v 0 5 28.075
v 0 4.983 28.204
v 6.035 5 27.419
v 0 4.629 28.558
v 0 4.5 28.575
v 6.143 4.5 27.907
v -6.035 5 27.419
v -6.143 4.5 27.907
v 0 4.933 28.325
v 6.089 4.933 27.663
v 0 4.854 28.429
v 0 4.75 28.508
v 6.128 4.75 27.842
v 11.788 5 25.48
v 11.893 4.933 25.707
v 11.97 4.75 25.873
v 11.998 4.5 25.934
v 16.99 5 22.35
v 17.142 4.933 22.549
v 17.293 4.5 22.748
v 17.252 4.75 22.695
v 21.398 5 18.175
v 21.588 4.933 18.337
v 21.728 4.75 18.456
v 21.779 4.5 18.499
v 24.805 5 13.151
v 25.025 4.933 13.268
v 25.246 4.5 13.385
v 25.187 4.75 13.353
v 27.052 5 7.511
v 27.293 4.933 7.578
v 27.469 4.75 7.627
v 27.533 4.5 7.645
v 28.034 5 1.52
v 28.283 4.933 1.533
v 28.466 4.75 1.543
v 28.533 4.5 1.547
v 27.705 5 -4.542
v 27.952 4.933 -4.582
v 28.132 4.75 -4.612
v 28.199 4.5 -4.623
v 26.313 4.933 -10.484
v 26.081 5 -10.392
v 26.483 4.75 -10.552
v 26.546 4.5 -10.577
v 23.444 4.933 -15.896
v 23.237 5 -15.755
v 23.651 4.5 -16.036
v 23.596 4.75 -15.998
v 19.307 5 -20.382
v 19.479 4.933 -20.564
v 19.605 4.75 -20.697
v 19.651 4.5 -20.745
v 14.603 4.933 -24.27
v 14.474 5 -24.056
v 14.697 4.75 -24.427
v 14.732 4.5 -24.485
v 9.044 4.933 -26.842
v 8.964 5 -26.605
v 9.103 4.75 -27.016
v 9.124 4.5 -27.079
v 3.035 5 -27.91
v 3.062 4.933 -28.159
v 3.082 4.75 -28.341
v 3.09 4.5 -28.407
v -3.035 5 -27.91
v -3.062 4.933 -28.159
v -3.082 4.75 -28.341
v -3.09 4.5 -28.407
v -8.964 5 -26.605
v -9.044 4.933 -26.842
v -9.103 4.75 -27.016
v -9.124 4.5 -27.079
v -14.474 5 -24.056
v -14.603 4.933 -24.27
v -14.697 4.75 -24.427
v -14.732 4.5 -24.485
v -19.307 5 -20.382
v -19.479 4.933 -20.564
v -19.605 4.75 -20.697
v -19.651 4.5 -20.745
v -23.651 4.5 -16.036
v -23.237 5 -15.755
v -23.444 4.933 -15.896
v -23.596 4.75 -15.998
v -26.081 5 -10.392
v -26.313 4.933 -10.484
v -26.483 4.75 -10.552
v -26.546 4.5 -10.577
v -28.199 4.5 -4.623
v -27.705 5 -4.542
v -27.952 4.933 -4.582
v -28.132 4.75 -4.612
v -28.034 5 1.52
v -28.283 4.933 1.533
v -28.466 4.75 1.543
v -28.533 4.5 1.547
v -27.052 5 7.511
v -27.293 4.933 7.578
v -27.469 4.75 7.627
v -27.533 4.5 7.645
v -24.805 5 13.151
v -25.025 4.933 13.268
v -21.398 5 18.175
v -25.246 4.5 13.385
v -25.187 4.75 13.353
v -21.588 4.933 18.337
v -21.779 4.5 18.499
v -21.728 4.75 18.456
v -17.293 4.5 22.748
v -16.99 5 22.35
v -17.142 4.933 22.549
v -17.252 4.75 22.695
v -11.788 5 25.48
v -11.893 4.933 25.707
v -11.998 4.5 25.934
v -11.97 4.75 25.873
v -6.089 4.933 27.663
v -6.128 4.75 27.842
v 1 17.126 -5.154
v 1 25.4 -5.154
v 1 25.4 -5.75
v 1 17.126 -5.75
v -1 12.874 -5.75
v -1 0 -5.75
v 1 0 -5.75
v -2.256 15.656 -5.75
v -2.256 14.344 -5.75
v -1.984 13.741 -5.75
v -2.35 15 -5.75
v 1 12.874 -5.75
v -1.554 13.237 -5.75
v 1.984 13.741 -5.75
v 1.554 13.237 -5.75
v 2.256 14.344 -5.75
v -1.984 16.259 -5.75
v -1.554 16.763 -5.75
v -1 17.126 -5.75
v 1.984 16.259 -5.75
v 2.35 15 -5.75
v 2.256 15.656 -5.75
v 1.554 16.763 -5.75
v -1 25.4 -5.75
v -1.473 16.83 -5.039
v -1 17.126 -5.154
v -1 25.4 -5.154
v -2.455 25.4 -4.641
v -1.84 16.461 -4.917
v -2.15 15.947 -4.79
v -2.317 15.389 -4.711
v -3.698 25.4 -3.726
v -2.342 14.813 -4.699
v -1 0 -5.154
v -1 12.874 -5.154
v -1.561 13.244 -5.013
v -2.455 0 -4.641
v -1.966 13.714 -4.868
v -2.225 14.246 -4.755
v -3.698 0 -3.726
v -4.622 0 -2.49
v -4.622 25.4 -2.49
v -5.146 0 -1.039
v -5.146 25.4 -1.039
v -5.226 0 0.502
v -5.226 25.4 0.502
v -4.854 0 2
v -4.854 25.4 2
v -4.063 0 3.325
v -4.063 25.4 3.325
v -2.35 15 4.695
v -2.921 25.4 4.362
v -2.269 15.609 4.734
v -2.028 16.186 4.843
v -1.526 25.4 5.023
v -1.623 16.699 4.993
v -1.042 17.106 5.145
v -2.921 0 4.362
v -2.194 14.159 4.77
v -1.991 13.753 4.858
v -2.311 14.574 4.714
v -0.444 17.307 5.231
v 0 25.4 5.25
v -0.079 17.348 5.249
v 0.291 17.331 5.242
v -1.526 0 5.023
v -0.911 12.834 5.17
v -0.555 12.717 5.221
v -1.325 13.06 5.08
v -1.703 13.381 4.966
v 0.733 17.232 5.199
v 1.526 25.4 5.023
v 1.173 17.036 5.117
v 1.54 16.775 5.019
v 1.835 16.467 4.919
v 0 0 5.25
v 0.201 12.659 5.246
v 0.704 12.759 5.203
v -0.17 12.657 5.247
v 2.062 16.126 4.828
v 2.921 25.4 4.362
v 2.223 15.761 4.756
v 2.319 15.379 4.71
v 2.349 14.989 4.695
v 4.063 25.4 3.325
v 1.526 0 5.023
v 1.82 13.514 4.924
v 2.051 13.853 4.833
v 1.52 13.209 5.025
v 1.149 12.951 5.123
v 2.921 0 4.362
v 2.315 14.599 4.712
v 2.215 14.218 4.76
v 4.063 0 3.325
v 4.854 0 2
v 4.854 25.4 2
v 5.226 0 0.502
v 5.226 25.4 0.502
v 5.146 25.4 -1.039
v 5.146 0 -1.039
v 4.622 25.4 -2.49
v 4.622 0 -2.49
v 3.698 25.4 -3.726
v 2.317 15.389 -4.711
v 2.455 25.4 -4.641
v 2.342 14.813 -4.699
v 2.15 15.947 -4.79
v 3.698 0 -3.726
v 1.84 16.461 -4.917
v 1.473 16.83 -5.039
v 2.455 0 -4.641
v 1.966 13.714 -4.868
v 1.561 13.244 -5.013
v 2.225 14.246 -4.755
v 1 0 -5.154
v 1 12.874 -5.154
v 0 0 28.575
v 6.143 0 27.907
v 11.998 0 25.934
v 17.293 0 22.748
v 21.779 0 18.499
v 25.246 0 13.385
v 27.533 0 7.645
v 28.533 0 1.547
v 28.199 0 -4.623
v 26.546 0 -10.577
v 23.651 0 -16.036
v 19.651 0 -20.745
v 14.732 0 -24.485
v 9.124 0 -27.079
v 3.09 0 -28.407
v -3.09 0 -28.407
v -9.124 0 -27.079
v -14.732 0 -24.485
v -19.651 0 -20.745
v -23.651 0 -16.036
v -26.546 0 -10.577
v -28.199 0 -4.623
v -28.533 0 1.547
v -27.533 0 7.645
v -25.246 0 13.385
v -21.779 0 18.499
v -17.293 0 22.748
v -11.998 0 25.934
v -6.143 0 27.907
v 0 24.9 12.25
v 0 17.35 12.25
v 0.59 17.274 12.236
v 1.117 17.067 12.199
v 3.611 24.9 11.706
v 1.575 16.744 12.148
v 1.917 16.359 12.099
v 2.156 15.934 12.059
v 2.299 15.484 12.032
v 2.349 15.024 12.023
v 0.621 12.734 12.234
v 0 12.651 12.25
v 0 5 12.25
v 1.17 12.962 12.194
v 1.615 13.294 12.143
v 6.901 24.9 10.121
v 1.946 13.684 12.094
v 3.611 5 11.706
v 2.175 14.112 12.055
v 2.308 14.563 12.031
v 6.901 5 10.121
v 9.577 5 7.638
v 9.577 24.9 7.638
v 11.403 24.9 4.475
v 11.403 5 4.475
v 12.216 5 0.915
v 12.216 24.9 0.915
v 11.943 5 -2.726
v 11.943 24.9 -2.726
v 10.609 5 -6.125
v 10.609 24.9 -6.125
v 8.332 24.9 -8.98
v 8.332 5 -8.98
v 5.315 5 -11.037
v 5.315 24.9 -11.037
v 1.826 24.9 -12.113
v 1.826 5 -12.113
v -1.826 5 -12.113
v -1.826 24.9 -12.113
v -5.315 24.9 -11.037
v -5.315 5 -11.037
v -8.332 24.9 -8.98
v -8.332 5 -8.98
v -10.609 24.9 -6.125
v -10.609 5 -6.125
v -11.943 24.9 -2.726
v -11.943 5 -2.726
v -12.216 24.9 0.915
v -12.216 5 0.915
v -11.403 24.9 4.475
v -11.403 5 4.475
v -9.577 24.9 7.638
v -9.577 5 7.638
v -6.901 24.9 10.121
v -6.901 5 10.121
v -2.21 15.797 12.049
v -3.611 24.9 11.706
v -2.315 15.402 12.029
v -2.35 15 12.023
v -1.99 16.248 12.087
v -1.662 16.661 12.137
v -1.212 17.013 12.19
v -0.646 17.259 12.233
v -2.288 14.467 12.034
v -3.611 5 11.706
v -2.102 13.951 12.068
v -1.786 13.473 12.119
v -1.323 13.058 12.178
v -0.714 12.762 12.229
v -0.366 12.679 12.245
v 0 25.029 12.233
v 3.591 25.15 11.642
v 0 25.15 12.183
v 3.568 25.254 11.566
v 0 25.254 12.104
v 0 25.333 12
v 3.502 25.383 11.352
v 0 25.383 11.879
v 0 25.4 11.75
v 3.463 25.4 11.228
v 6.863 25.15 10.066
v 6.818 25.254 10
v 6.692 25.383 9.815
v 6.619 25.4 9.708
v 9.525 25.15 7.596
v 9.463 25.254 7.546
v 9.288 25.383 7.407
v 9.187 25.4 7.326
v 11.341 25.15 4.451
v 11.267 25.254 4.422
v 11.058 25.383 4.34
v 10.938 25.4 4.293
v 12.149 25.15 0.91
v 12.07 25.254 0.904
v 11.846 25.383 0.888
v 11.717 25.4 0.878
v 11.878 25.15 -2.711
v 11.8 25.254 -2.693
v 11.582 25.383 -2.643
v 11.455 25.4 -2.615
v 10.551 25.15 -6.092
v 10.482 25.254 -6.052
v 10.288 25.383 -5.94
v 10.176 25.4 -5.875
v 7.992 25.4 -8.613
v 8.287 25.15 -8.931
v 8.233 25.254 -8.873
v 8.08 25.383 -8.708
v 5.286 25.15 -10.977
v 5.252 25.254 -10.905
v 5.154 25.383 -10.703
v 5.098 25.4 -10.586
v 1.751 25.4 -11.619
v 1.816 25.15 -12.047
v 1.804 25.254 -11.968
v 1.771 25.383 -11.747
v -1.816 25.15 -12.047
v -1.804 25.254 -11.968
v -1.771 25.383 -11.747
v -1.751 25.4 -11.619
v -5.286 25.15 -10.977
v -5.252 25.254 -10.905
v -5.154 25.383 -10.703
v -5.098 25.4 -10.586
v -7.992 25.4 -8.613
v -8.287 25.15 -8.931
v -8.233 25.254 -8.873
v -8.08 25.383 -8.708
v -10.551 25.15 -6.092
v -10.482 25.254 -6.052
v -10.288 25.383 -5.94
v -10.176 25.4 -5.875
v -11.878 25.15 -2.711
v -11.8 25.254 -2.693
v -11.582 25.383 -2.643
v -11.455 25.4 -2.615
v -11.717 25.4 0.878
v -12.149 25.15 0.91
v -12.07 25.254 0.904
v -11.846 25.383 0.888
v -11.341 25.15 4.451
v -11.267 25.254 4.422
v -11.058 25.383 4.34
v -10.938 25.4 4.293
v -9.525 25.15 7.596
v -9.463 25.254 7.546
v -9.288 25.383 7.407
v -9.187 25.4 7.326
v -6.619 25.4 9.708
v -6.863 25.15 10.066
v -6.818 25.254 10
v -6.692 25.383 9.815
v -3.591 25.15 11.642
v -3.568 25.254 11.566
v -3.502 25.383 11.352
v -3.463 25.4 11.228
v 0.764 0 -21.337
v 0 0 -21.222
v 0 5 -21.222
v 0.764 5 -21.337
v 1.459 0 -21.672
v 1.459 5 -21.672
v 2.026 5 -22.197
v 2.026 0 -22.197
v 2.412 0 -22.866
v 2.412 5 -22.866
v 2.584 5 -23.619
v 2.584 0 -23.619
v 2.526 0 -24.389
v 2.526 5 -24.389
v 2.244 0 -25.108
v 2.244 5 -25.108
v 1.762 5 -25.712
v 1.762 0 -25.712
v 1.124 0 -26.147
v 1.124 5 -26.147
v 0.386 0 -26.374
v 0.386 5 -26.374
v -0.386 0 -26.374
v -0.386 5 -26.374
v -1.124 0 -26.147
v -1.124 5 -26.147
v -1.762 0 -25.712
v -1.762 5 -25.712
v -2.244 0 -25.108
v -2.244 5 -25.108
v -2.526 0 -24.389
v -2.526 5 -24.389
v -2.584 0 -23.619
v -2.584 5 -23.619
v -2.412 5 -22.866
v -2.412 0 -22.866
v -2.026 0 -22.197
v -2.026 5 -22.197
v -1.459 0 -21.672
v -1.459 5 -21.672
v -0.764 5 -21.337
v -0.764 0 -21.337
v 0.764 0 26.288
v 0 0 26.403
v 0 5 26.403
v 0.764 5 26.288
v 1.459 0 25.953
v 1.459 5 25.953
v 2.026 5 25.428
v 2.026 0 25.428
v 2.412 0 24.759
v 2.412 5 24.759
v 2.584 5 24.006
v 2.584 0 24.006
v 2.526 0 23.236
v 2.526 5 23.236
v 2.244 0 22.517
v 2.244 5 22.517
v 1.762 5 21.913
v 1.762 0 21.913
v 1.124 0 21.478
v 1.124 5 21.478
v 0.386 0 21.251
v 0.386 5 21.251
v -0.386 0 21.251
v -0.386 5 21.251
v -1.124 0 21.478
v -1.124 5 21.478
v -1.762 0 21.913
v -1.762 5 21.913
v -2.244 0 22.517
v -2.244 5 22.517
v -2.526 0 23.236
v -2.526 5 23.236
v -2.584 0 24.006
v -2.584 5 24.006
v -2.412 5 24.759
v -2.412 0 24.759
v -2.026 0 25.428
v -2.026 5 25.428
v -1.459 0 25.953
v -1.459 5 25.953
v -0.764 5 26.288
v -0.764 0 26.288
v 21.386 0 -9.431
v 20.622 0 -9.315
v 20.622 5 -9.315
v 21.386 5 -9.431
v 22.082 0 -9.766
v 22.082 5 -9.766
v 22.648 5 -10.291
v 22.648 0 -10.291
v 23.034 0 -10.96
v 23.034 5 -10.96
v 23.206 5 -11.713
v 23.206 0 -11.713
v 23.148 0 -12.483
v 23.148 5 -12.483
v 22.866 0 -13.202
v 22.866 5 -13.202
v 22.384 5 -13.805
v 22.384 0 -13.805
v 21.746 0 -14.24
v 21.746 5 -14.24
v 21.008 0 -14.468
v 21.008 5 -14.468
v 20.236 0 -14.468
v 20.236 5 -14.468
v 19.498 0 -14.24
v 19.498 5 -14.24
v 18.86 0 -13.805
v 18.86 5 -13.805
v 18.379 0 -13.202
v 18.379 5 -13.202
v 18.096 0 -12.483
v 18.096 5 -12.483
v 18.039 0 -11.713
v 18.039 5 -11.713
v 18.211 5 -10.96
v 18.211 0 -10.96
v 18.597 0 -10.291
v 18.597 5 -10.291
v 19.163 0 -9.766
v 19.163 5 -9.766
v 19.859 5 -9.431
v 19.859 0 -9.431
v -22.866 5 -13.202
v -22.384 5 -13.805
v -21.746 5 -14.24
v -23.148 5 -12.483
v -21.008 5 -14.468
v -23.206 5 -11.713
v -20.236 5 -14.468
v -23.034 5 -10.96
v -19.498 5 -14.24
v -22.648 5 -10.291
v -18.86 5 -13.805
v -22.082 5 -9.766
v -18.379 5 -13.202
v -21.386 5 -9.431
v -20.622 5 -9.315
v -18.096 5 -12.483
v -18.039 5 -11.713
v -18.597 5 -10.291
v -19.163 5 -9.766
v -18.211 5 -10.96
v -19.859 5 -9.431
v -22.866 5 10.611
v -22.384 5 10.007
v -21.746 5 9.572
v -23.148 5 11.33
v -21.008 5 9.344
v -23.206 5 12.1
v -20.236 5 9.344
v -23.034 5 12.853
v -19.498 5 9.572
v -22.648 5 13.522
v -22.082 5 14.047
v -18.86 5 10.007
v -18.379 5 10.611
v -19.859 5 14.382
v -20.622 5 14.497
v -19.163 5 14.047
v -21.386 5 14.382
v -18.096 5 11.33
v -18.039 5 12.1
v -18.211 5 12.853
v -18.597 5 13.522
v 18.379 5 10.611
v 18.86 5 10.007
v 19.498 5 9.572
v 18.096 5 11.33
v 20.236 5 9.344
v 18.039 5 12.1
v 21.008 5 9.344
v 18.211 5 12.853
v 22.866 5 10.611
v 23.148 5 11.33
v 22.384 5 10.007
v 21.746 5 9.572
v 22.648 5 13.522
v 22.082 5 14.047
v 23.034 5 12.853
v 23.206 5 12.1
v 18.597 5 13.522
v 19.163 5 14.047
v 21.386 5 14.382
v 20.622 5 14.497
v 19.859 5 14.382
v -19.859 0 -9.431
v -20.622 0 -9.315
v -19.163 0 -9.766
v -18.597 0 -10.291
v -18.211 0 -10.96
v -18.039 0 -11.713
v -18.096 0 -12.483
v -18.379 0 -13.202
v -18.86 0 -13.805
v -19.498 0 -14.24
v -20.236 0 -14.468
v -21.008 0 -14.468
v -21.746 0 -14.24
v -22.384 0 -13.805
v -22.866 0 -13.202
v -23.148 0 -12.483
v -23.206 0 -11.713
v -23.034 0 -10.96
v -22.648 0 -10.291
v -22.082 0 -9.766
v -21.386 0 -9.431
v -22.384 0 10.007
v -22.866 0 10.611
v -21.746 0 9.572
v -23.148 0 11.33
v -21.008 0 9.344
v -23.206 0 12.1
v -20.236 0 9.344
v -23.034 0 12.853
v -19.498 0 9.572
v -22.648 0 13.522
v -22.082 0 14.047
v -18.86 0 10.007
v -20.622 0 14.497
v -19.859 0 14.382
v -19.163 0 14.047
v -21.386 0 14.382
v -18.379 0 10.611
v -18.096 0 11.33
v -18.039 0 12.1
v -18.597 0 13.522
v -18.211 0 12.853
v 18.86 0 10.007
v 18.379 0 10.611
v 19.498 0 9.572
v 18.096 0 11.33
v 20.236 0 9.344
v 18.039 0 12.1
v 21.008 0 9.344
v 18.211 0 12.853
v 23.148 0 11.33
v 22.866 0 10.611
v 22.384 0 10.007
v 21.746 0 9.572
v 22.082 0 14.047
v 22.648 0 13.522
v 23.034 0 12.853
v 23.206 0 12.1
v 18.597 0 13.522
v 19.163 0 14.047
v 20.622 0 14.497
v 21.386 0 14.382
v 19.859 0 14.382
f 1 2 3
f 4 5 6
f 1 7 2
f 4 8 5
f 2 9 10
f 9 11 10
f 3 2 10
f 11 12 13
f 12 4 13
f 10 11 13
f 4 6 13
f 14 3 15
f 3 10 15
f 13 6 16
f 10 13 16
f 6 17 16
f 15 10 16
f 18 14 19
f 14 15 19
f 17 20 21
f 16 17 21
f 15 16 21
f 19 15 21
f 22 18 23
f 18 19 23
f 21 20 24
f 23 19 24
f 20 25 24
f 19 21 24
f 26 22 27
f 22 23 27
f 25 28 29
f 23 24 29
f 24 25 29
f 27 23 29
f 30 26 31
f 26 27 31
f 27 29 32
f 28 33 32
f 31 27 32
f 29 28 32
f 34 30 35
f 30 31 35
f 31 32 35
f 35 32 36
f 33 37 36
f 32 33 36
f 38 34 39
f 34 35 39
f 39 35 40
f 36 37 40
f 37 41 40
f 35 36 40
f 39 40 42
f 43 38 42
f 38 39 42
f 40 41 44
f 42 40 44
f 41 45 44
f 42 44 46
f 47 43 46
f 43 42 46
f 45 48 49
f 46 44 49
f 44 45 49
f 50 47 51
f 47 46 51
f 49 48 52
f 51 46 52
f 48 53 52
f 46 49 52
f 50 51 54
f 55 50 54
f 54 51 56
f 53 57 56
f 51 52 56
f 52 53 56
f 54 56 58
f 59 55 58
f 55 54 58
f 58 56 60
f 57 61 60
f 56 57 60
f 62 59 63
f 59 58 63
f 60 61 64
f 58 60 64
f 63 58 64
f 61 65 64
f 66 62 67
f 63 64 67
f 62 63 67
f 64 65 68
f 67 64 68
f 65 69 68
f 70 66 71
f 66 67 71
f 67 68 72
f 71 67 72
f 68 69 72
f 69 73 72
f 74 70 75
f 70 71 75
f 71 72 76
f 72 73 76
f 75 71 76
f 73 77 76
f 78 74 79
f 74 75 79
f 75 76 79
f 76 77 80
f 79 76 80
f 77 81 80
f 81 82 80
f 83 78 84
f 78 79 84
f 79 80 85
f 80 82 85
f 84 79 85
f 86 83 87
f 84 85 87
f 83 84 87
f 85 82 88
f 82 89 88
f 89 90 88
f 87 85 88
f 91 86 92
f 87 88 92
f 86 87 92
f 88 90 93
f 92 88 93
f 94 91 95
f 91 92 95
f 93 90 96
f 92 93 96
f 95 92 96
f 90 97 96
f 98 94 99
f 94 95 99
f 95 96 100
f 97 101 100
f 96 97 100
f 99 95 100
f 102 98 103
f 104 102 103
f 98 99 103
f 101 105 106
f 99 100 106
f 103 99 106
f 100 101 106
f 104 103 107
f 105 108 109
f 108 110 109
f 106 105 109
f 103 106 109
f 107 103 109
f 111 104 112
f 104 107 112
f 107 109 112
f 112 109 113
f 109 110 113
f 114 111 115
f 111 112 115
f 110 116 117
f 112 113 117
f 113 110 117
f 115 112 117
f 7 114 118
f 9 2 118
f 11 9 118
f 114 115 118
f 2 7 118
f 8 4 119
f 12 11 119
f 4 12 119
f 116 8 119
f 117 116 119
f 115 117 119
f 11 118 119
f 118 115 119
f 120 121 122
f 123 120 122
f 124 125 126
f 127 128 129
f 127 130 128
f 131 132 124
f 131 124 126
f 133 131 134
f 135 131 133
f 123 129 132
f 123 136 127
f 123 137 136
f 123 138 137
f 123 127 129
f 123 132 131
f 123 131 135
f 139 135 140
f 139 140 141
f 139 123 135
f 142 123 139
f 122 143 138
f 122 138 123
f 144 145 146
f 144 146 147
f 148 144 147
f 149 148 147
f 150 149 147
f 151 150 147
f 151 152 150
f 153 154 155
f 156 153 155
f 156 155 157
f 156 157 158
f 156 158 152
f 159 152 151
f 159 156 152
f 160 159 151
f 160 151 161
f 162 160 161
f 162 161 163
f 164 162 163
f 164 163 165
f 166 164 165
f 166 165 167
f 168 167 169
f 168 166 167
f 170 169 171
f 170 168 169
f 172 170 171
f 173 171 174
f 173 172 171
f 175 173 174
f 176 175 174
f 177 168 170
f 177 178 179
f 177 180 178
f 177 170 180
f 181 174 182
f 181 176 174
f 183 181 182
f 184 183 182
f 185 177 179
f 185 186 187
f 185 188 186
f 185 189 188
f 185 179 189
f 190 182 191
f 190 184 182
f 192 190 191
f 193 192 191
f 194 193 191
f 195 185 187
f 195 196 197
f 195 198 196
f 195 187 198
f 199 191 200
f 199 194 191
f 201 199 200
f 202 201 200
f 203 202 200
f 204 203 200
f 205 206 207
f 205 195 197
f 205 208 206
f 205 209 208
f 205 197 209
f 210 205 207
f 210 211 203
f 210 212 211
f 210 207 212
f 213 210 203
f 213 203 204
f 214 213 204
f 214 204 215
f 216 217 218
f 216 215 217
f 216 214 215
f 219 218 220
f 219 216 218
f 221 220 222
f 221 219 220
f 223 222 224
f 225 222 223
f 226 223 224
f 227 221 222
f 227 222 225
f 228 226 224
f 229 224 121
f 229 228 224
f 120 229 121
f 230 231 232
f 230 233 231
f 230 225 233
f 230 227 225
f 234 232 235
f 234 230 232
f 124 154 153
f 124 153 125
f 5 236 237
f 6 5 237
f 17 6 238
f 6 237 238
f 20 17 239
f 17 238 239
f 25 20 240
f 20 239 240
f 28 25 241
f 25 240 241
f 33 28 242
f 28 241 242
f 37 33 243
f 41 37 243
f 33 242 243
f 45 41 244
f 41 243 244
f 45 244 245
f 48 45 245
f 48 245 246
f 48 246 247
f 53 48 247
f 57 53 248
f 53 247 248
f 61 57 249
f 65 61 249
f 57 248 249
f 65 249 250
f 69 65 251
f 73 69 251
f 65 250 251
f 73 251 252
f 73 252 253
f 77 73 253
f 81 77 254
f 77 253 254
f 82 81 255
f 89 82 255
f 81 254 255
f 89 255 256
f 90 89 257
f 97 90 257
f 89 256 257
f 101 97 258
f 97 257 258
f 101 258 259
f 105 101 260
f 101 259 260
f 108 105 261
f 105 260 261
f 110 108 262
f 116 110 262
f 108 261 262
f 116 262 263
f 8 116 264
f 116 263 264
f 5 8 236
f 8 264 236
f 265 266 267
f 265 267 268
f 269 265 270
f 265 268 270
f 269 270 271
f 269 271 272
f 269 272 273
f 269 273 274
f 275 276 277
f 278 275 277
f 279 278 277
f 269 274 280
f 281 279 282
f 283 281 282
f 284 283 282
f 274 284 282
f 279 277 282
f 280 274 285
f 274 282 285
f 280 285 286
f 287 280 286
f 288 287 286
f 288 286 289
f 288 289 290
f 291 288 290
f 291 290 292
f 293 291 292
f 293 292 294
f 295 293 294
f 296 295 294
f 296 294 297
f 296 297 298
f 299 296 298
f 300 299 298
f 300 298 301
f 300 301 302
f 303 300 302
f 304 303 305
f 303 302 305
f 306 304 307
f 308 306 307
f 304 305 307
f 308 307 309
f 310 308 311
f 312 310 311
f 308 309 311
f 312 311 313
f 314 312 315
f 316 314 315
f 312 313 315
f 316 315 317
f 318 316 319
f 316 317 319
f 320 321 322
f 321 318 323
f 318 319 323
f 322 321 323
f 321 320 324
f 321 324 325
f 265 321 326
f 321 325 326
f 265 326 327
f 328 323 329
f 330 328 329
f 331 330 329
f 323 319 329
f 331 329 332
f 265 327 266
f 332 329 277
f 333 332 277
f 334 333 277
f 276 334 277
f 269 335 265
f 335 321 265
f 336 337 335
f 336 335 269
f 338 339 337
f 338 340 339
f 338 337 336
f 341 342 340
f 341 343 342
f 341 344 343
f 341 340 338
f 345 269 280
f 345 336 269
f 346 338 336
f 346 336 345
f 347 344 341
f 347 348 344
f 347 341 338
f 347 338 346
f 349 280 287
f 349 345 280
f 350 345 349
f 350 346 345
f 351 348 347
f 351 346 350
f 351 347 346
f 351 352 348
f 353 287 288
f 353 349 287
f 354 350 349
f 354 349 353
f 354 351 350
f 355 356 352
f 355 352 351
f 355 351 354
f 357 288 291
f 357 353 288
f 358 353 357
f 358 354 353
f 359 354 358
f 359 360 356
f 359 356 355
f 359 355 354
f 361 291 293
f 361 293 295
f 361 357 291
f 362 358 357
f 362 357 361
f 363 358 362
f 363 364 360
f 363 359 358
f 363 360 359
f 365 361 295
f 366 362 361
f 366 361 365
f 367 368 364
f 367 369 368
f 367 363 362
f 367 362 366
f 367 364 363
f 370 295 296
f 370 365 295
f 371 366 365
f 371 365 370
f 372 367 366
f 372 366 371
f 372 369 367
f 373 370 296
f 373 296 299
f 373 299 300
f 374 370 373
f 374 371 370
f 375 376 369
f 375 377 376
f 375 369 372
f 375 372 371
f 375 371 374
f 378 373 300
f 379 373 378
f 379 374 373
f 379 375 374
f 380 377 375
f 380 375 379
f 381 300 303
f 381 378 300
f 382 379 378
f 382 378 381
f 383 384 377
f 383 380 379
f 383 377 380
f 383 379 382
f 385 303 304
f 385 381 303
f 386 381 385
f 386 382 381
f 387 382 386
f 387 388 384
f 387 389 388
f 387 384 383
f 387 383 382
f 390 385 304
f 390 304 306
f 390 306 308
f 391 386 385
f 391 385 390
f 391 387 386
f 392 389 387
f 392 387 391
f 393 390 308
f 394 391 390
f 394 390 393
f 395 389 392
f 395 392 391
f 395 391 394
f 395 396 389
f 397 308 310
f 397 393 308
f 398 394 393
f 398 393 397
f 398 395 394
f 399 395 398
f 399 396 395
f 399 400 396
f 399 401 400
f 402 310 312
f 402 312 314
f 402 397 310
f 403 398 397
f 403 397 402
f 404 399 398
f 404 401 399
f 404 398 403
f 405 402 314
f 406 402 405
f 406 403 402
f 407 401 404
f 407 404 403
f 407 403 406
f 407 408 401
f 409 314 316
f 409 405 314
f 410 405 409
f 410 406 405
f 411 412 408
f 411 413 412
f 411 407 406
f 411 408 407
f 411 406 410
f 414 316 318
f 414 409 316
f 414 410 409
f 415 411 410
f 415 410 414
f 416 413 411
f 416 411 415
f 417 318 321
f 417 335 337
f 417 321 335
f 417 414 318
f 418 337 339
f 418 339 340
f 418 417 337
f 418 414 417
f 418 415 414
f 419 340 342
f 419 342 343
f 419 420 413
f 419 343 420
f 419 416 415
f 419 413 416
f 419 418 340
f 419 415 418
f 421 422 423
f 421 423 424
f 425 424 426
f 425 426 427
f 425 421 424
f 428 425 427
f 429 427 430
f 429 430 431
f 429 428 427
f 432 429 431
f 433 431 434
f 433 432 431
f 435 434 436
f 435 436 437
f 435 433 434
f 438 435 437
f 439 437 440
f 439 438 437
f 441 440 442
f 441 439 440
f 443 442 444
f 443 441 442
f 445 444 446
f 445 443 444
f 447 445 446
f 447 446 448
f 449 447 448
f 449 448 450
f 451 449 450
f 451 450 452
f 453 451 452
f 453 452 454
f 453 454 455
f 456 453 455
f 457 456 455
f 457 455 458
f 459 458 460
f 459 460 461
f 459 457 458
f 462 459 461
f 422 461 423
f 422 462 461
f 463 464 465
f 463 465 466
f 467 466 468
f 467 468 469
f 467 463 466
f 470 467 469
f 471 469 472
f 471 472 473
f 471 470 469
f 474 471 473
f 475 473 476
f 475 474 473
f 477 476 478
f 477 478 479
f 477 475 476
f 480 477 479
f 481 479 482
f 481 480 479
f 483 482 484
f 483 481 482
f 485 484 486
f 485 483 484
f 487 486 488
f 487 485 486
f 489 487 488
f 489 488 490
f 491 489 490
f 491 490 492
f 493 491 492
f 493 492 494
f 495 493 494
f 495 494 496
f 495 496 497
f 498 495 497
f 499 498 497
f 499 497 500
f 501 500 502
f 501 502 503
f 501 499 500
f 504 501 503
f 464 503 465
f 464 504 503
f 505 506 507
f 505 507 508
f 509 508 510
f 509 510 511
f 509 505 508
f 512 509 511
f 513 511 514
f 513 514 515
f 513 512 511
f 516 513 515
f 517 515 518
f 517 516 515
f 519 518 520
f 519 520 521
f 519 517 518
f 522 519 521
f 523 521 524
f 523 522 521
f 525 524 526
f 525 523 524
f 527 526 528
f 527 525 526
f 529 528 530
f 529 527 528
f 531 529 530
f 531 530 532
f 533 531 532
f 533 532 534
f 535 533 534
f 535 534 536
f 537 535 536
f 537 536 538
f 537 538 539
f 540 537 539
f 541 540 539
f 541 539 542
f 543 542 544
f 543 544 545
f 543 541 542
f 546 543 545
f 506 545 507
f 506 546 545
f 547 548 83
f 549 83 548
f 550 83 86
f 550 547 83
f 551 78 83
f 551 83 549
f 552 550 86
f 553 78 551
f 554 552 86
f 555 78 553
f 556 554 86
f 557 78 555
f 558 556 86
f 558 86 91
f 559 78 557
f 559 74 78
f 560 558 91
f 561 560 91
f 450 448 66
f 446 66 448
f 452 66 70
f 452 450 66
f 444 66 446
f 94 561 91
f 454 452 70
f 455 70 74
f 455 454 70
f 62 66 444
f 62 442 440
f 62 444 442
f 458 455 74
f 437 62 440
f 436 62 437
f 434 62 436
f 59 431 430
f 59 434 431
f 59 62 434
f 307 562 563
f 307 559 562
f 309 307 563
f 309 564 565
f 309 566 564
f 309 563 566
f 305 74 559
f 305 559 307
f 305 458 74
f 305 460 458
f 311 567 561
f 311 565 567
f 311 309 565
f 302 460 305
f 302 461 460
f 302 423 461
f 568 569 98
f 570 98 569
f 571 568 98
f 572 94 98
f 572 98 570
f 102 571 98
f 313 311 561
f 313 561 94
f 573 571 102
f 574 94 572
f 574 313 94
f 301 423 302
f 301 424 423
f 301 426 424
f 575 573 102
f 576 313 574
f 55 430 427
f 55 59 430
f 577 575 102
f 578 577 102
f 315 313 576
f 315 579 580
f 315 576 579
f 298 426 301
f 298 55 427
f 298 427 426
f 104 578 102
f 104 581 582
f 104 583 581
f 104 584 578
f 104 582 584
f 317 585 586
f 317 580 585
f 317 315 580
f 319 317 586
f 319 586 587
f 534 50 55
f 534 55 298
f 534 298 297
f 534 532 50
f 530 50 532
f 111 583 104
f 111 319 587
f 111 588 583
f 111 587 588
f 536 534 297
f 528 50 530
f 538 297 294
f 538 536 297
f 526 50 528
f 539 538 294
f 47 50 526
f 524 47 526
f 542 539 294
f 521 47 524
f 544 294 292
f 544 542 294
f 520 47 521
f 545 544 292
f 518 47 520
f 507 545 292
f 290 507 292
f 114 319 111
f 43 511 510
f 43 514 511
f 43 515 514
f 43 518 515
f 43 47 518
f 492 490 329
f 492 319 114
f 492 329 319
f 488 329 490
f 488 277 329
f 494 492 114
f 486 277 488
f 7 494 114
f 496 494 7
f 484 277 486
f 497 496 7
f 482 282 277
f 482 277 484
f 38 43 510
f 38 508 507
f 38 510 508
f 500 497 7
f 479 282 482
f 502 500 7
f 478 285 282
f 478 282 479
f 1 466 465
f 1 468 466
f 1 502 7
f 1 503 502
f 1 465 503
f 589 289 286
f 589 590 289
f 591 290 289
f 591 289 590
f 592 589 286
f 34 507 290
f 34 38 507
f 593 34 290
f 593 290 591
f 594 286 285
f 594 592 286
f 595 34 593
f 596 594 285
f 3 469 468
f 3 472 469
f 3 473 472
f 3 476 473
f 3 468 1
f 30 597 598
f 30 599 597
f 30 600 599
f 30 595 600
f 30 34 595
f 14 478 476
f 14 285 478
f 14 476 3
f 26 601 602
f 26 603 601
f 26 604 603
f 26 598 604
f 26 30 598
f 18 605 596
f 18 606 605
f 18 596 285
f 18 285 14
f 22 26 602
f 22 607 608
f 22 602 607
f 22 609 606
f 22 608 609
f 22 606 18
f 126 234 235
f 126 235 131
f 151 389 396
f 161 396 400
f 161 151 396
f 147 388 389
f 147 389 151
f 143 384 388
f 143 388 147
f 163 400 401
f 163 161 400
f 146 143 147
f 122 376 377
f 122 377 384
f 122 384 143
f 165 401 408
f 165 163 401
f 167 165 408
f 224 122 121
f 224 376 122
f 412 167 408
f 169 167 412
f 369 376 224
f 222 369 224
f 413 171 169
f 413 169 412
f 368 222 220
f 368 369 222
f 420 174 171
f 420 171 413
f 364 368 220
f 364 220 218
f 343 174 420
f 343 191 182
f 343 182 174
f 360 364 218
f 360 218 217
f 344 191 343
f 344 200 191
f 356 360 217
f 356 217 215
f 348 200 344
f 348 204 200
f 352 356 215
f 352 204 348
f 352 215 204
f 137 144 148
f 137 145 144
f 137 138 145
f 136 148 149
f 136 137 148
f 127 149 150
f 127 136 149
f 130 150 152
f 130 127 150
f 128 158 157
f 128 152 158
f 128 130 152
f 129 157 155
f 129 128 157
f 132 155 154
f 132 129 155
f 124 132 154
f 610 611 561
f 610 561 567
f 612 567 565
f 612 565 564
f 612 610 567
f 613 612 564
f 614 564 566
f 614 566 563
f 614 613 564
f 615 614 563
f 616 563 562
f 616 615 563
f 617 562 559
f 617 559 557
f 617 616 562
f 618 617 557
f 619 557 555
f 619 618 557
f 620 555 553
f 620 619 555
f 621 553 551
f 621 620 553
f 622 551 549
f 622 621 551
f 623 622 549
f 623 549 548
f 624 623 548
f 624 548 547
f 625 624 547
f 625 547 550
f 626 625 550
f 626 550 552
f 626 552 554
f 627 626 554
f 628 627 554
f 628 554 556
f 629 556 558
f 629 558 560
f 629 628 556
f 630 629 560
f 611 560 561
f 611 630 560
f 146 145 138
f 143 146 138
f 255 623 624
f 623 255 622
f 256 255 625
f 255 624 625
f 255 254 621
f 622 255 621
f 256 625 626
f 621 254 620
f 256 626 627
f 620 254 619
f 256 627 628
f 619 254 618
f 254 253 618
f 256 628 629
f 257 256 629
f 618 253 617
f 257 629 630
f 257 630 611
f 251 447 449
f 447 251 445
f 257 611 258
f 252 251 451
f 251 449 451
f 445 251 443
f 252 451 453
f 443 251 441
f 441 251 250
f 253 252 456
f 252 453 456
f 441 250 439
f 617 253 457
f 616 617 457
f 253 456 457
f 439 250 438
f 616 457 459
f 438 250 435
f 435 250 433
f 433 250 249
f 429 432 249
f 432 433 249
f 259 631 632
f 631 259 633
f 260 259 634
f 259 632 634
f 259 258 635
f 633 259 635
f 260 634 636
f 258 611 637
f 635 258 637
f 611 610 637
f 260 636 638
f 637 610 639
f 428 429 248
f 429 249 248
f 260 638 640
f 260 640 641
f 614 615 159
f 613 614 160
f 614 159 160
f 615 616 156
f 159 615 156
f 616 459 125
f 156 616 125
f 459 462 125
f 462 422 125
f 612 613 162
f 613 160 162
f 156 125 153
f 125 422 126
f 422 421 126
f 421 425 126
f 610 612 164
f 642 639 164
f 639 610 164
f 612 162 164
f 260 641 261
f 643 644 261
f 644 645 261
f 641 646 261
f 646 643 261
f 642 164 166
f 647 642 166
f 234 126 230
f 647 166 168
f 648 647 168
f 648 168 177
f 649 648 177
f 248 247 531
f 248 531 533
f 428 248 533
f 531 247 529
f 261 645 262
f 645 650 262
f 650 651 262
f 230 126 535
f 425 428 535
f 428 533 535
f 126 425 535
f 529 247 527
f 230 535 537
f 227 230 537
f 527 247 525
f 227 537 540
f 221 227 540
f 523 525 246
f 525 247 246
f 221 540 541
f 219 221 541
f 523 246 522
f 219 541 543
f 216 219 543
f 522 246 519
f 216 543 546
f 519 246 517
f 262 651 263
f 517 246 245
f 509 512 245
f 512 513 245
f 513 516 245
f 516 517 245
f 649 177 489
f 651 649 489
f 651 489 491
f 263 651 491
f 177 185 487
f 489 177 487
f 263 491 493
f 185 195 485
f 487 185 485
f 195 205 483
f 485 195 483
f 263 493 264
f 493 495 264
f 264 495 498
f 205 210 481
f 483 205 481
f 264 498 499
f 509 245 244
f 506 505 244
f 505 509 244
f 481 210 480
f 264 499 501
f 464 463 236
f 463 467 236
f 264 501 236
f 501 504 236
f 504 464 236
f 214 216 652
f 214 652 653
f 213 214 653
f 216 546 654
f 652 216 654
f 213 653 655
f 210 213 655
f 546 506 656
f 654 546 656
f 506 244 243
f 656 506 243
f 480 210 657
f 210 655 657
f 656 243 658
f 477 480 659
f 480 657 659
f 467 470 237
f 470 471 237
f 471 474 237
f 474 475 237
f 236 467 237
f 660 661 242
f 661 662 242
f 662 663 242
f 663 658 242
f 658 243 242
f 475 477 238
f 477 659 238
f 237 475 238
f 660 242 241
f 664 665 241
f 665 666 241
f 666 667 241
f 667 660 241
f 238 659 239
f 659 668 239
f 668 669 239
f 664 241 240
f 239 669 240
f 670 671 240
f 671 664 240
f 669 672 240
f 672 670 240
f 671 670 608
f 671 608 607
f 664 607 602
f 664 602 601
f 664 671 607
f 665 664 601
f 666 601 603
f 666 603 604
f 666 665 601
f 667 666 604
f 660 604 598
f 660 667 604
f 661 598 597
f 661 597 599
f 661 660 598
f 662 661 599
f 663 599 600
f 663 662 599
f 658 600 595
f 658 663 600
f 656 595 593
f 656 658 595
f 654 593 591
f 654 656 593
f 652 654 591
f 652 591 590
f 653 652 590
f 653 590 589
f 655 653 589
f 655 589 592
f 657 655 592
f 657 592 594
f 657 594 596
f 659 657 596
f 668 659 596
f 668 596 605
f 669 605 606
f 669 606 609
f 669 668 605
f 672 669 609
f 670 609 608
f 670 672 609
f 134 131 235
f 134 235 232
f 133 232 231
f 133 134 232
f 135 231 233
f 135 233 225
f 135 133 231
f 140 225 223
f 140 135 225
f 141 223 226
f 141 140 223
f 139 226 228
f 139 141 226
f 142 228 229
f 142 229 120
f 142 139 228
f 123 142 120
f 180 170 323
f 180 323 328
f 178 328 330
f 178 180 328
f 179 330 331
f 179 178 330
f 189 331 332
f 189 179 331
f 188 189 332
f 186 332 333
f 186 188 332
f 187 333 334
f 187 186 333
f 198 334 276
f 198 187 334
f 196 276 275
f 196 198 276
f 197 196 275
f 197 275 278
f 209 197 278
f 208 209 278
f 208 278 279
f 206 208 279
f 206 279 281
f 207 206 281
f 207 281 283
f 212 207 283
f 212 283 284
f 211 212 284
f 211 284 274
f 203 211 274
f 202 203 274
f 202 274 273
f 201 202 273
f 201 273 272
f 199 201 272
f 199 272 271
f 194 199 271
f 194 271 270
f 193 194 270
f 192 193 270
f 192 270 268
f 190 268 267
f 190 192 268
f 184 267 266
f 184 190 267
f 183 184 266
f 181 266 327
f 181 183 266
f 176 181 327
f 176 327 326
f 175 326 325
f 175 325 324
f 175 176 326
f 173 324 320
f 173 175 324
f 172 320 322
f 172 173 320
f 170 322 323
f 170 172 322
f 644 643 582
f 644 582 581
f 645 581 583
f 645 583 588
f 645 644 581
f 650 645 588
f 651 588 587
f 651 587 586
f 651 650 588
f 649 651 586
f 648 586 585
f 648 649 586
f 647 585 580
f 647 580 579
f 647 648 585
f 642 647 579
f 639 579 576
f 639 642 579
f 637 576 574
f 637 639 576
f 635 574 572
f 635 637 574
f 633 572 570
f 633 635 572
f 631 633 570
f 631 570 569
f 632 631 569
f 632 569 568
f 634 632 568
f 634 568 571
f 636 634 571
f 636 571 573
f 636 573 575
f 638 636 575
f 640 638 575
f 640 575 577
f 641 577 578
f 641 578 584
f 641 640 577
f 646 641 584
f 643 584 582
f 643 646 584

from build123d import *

# Parameters (mm, degrees)
SKETCH1_R           = 28.575
SKETCH1_R_2         = 2.5908
SKETCH1_R_3         = 12.25
BOSS_EXTRUDE1_DEPTH = 5
SKETCH1_3_R         = 12.25
SKETCH1_3_R_2       = 5.25
BOSS_EXTRUDE2_DEPTH = 25.4
FILLET2_R           = 0.5
SKETCH2_W           = 2
SKETCH2_H           = 1
CUT_EXTRUDE1_DEPTH  = 48.730716061
SKETCH3_R           = 2.3495
CUT_EXTRUDE4_DEPTH  = 25.4


with BuildPart() as part:
    # Sketch1 → Boss-Extrude1 (new body)
    with BuildSketch(Plane(origin=(0, 0, 0), x_dir=(1, 0, 0), z_dir=(0, 1, 0))):
        Circle(SKETCH1_R)
        with Locations((-20.622229928, -11.90625)):
            Circle(SKETCH1_R_2, mode=Mode.SUBTRACT)
        with Locations((0, -23.8125)):
            Circle(SKETCH1_R_2, mode=Mode.SUBTRACT)
        with Locations((20.622229928, -11.90625)):
            Circle(SKETCH1_R_2, mode=Mode.SUBTRACT)
        with Locations((-20.622229928, 11.90625)):
            Circle(SKETCH1_R_2, mode=Mode.SUBTRACT)
        Circle(SKETCH1_R_3, mode=Mode.SUBTRACT)
        with Locations((20.622229928, 11.90625)):
            Circle(SKETCH1_R_2, mode=Mode.SUBTRACT)
        with Locations((0, 23.8125)):
            Circle(SKETCH1_R_2, mode=Mode.SUBTRACT)
    extrude(amount=BOSS_EXTRUDE1_DEPTH)

    # Sketch1<3> → Boss-Extrude2 (add)
    with BuildSketch(Plane(origin=(0, 0, 0), x_dir=(1, 0, 0), z_dir=(0, 1, 0))):
        Circle(SKETCH1_3_R)
        Circle(SKETCH1_3_R_2, mode=Mode.SUBTRACT)
    extrude(amount=BOSS_EXTRUDE2_DEPTH)

    # Fillet2
    fillet2_edges = [part.edges().sort_by_distance(p)[0] for p in [
        (-12.25, 25.4, 0),
        (-28.575, 5, 0),
    ]]
    fillet(fillet2_edges, radius=FILLET2_R)

    # Sketch2 → Cut-Extrude1 (cut, through all)
    with BuildSketch(Plane(origin=(0, 25.4, 0), x_dir=(1, 0, 0), z_dir=(0, 1, 0))):
        with Locations((0, 5.25)):
            Rectangle(SKETCH2_W, SKETCH2_H)
    extrude(amount=-CUT_EXTRUDE1_DEPTH, mode=Mode.SUBTRACT)

    # Sketch3 → Cut-Extrude4 (cut)
    with BuildSketch(Plane.XY.offset(-5.75)):
        with Locations((0, 15)):
            Circle(SKETCH3_R)
    extrude(amount=CUT_EXTRUDE4_DEPTH, mode=Mode.SUBTRACT)


solid = part.part
